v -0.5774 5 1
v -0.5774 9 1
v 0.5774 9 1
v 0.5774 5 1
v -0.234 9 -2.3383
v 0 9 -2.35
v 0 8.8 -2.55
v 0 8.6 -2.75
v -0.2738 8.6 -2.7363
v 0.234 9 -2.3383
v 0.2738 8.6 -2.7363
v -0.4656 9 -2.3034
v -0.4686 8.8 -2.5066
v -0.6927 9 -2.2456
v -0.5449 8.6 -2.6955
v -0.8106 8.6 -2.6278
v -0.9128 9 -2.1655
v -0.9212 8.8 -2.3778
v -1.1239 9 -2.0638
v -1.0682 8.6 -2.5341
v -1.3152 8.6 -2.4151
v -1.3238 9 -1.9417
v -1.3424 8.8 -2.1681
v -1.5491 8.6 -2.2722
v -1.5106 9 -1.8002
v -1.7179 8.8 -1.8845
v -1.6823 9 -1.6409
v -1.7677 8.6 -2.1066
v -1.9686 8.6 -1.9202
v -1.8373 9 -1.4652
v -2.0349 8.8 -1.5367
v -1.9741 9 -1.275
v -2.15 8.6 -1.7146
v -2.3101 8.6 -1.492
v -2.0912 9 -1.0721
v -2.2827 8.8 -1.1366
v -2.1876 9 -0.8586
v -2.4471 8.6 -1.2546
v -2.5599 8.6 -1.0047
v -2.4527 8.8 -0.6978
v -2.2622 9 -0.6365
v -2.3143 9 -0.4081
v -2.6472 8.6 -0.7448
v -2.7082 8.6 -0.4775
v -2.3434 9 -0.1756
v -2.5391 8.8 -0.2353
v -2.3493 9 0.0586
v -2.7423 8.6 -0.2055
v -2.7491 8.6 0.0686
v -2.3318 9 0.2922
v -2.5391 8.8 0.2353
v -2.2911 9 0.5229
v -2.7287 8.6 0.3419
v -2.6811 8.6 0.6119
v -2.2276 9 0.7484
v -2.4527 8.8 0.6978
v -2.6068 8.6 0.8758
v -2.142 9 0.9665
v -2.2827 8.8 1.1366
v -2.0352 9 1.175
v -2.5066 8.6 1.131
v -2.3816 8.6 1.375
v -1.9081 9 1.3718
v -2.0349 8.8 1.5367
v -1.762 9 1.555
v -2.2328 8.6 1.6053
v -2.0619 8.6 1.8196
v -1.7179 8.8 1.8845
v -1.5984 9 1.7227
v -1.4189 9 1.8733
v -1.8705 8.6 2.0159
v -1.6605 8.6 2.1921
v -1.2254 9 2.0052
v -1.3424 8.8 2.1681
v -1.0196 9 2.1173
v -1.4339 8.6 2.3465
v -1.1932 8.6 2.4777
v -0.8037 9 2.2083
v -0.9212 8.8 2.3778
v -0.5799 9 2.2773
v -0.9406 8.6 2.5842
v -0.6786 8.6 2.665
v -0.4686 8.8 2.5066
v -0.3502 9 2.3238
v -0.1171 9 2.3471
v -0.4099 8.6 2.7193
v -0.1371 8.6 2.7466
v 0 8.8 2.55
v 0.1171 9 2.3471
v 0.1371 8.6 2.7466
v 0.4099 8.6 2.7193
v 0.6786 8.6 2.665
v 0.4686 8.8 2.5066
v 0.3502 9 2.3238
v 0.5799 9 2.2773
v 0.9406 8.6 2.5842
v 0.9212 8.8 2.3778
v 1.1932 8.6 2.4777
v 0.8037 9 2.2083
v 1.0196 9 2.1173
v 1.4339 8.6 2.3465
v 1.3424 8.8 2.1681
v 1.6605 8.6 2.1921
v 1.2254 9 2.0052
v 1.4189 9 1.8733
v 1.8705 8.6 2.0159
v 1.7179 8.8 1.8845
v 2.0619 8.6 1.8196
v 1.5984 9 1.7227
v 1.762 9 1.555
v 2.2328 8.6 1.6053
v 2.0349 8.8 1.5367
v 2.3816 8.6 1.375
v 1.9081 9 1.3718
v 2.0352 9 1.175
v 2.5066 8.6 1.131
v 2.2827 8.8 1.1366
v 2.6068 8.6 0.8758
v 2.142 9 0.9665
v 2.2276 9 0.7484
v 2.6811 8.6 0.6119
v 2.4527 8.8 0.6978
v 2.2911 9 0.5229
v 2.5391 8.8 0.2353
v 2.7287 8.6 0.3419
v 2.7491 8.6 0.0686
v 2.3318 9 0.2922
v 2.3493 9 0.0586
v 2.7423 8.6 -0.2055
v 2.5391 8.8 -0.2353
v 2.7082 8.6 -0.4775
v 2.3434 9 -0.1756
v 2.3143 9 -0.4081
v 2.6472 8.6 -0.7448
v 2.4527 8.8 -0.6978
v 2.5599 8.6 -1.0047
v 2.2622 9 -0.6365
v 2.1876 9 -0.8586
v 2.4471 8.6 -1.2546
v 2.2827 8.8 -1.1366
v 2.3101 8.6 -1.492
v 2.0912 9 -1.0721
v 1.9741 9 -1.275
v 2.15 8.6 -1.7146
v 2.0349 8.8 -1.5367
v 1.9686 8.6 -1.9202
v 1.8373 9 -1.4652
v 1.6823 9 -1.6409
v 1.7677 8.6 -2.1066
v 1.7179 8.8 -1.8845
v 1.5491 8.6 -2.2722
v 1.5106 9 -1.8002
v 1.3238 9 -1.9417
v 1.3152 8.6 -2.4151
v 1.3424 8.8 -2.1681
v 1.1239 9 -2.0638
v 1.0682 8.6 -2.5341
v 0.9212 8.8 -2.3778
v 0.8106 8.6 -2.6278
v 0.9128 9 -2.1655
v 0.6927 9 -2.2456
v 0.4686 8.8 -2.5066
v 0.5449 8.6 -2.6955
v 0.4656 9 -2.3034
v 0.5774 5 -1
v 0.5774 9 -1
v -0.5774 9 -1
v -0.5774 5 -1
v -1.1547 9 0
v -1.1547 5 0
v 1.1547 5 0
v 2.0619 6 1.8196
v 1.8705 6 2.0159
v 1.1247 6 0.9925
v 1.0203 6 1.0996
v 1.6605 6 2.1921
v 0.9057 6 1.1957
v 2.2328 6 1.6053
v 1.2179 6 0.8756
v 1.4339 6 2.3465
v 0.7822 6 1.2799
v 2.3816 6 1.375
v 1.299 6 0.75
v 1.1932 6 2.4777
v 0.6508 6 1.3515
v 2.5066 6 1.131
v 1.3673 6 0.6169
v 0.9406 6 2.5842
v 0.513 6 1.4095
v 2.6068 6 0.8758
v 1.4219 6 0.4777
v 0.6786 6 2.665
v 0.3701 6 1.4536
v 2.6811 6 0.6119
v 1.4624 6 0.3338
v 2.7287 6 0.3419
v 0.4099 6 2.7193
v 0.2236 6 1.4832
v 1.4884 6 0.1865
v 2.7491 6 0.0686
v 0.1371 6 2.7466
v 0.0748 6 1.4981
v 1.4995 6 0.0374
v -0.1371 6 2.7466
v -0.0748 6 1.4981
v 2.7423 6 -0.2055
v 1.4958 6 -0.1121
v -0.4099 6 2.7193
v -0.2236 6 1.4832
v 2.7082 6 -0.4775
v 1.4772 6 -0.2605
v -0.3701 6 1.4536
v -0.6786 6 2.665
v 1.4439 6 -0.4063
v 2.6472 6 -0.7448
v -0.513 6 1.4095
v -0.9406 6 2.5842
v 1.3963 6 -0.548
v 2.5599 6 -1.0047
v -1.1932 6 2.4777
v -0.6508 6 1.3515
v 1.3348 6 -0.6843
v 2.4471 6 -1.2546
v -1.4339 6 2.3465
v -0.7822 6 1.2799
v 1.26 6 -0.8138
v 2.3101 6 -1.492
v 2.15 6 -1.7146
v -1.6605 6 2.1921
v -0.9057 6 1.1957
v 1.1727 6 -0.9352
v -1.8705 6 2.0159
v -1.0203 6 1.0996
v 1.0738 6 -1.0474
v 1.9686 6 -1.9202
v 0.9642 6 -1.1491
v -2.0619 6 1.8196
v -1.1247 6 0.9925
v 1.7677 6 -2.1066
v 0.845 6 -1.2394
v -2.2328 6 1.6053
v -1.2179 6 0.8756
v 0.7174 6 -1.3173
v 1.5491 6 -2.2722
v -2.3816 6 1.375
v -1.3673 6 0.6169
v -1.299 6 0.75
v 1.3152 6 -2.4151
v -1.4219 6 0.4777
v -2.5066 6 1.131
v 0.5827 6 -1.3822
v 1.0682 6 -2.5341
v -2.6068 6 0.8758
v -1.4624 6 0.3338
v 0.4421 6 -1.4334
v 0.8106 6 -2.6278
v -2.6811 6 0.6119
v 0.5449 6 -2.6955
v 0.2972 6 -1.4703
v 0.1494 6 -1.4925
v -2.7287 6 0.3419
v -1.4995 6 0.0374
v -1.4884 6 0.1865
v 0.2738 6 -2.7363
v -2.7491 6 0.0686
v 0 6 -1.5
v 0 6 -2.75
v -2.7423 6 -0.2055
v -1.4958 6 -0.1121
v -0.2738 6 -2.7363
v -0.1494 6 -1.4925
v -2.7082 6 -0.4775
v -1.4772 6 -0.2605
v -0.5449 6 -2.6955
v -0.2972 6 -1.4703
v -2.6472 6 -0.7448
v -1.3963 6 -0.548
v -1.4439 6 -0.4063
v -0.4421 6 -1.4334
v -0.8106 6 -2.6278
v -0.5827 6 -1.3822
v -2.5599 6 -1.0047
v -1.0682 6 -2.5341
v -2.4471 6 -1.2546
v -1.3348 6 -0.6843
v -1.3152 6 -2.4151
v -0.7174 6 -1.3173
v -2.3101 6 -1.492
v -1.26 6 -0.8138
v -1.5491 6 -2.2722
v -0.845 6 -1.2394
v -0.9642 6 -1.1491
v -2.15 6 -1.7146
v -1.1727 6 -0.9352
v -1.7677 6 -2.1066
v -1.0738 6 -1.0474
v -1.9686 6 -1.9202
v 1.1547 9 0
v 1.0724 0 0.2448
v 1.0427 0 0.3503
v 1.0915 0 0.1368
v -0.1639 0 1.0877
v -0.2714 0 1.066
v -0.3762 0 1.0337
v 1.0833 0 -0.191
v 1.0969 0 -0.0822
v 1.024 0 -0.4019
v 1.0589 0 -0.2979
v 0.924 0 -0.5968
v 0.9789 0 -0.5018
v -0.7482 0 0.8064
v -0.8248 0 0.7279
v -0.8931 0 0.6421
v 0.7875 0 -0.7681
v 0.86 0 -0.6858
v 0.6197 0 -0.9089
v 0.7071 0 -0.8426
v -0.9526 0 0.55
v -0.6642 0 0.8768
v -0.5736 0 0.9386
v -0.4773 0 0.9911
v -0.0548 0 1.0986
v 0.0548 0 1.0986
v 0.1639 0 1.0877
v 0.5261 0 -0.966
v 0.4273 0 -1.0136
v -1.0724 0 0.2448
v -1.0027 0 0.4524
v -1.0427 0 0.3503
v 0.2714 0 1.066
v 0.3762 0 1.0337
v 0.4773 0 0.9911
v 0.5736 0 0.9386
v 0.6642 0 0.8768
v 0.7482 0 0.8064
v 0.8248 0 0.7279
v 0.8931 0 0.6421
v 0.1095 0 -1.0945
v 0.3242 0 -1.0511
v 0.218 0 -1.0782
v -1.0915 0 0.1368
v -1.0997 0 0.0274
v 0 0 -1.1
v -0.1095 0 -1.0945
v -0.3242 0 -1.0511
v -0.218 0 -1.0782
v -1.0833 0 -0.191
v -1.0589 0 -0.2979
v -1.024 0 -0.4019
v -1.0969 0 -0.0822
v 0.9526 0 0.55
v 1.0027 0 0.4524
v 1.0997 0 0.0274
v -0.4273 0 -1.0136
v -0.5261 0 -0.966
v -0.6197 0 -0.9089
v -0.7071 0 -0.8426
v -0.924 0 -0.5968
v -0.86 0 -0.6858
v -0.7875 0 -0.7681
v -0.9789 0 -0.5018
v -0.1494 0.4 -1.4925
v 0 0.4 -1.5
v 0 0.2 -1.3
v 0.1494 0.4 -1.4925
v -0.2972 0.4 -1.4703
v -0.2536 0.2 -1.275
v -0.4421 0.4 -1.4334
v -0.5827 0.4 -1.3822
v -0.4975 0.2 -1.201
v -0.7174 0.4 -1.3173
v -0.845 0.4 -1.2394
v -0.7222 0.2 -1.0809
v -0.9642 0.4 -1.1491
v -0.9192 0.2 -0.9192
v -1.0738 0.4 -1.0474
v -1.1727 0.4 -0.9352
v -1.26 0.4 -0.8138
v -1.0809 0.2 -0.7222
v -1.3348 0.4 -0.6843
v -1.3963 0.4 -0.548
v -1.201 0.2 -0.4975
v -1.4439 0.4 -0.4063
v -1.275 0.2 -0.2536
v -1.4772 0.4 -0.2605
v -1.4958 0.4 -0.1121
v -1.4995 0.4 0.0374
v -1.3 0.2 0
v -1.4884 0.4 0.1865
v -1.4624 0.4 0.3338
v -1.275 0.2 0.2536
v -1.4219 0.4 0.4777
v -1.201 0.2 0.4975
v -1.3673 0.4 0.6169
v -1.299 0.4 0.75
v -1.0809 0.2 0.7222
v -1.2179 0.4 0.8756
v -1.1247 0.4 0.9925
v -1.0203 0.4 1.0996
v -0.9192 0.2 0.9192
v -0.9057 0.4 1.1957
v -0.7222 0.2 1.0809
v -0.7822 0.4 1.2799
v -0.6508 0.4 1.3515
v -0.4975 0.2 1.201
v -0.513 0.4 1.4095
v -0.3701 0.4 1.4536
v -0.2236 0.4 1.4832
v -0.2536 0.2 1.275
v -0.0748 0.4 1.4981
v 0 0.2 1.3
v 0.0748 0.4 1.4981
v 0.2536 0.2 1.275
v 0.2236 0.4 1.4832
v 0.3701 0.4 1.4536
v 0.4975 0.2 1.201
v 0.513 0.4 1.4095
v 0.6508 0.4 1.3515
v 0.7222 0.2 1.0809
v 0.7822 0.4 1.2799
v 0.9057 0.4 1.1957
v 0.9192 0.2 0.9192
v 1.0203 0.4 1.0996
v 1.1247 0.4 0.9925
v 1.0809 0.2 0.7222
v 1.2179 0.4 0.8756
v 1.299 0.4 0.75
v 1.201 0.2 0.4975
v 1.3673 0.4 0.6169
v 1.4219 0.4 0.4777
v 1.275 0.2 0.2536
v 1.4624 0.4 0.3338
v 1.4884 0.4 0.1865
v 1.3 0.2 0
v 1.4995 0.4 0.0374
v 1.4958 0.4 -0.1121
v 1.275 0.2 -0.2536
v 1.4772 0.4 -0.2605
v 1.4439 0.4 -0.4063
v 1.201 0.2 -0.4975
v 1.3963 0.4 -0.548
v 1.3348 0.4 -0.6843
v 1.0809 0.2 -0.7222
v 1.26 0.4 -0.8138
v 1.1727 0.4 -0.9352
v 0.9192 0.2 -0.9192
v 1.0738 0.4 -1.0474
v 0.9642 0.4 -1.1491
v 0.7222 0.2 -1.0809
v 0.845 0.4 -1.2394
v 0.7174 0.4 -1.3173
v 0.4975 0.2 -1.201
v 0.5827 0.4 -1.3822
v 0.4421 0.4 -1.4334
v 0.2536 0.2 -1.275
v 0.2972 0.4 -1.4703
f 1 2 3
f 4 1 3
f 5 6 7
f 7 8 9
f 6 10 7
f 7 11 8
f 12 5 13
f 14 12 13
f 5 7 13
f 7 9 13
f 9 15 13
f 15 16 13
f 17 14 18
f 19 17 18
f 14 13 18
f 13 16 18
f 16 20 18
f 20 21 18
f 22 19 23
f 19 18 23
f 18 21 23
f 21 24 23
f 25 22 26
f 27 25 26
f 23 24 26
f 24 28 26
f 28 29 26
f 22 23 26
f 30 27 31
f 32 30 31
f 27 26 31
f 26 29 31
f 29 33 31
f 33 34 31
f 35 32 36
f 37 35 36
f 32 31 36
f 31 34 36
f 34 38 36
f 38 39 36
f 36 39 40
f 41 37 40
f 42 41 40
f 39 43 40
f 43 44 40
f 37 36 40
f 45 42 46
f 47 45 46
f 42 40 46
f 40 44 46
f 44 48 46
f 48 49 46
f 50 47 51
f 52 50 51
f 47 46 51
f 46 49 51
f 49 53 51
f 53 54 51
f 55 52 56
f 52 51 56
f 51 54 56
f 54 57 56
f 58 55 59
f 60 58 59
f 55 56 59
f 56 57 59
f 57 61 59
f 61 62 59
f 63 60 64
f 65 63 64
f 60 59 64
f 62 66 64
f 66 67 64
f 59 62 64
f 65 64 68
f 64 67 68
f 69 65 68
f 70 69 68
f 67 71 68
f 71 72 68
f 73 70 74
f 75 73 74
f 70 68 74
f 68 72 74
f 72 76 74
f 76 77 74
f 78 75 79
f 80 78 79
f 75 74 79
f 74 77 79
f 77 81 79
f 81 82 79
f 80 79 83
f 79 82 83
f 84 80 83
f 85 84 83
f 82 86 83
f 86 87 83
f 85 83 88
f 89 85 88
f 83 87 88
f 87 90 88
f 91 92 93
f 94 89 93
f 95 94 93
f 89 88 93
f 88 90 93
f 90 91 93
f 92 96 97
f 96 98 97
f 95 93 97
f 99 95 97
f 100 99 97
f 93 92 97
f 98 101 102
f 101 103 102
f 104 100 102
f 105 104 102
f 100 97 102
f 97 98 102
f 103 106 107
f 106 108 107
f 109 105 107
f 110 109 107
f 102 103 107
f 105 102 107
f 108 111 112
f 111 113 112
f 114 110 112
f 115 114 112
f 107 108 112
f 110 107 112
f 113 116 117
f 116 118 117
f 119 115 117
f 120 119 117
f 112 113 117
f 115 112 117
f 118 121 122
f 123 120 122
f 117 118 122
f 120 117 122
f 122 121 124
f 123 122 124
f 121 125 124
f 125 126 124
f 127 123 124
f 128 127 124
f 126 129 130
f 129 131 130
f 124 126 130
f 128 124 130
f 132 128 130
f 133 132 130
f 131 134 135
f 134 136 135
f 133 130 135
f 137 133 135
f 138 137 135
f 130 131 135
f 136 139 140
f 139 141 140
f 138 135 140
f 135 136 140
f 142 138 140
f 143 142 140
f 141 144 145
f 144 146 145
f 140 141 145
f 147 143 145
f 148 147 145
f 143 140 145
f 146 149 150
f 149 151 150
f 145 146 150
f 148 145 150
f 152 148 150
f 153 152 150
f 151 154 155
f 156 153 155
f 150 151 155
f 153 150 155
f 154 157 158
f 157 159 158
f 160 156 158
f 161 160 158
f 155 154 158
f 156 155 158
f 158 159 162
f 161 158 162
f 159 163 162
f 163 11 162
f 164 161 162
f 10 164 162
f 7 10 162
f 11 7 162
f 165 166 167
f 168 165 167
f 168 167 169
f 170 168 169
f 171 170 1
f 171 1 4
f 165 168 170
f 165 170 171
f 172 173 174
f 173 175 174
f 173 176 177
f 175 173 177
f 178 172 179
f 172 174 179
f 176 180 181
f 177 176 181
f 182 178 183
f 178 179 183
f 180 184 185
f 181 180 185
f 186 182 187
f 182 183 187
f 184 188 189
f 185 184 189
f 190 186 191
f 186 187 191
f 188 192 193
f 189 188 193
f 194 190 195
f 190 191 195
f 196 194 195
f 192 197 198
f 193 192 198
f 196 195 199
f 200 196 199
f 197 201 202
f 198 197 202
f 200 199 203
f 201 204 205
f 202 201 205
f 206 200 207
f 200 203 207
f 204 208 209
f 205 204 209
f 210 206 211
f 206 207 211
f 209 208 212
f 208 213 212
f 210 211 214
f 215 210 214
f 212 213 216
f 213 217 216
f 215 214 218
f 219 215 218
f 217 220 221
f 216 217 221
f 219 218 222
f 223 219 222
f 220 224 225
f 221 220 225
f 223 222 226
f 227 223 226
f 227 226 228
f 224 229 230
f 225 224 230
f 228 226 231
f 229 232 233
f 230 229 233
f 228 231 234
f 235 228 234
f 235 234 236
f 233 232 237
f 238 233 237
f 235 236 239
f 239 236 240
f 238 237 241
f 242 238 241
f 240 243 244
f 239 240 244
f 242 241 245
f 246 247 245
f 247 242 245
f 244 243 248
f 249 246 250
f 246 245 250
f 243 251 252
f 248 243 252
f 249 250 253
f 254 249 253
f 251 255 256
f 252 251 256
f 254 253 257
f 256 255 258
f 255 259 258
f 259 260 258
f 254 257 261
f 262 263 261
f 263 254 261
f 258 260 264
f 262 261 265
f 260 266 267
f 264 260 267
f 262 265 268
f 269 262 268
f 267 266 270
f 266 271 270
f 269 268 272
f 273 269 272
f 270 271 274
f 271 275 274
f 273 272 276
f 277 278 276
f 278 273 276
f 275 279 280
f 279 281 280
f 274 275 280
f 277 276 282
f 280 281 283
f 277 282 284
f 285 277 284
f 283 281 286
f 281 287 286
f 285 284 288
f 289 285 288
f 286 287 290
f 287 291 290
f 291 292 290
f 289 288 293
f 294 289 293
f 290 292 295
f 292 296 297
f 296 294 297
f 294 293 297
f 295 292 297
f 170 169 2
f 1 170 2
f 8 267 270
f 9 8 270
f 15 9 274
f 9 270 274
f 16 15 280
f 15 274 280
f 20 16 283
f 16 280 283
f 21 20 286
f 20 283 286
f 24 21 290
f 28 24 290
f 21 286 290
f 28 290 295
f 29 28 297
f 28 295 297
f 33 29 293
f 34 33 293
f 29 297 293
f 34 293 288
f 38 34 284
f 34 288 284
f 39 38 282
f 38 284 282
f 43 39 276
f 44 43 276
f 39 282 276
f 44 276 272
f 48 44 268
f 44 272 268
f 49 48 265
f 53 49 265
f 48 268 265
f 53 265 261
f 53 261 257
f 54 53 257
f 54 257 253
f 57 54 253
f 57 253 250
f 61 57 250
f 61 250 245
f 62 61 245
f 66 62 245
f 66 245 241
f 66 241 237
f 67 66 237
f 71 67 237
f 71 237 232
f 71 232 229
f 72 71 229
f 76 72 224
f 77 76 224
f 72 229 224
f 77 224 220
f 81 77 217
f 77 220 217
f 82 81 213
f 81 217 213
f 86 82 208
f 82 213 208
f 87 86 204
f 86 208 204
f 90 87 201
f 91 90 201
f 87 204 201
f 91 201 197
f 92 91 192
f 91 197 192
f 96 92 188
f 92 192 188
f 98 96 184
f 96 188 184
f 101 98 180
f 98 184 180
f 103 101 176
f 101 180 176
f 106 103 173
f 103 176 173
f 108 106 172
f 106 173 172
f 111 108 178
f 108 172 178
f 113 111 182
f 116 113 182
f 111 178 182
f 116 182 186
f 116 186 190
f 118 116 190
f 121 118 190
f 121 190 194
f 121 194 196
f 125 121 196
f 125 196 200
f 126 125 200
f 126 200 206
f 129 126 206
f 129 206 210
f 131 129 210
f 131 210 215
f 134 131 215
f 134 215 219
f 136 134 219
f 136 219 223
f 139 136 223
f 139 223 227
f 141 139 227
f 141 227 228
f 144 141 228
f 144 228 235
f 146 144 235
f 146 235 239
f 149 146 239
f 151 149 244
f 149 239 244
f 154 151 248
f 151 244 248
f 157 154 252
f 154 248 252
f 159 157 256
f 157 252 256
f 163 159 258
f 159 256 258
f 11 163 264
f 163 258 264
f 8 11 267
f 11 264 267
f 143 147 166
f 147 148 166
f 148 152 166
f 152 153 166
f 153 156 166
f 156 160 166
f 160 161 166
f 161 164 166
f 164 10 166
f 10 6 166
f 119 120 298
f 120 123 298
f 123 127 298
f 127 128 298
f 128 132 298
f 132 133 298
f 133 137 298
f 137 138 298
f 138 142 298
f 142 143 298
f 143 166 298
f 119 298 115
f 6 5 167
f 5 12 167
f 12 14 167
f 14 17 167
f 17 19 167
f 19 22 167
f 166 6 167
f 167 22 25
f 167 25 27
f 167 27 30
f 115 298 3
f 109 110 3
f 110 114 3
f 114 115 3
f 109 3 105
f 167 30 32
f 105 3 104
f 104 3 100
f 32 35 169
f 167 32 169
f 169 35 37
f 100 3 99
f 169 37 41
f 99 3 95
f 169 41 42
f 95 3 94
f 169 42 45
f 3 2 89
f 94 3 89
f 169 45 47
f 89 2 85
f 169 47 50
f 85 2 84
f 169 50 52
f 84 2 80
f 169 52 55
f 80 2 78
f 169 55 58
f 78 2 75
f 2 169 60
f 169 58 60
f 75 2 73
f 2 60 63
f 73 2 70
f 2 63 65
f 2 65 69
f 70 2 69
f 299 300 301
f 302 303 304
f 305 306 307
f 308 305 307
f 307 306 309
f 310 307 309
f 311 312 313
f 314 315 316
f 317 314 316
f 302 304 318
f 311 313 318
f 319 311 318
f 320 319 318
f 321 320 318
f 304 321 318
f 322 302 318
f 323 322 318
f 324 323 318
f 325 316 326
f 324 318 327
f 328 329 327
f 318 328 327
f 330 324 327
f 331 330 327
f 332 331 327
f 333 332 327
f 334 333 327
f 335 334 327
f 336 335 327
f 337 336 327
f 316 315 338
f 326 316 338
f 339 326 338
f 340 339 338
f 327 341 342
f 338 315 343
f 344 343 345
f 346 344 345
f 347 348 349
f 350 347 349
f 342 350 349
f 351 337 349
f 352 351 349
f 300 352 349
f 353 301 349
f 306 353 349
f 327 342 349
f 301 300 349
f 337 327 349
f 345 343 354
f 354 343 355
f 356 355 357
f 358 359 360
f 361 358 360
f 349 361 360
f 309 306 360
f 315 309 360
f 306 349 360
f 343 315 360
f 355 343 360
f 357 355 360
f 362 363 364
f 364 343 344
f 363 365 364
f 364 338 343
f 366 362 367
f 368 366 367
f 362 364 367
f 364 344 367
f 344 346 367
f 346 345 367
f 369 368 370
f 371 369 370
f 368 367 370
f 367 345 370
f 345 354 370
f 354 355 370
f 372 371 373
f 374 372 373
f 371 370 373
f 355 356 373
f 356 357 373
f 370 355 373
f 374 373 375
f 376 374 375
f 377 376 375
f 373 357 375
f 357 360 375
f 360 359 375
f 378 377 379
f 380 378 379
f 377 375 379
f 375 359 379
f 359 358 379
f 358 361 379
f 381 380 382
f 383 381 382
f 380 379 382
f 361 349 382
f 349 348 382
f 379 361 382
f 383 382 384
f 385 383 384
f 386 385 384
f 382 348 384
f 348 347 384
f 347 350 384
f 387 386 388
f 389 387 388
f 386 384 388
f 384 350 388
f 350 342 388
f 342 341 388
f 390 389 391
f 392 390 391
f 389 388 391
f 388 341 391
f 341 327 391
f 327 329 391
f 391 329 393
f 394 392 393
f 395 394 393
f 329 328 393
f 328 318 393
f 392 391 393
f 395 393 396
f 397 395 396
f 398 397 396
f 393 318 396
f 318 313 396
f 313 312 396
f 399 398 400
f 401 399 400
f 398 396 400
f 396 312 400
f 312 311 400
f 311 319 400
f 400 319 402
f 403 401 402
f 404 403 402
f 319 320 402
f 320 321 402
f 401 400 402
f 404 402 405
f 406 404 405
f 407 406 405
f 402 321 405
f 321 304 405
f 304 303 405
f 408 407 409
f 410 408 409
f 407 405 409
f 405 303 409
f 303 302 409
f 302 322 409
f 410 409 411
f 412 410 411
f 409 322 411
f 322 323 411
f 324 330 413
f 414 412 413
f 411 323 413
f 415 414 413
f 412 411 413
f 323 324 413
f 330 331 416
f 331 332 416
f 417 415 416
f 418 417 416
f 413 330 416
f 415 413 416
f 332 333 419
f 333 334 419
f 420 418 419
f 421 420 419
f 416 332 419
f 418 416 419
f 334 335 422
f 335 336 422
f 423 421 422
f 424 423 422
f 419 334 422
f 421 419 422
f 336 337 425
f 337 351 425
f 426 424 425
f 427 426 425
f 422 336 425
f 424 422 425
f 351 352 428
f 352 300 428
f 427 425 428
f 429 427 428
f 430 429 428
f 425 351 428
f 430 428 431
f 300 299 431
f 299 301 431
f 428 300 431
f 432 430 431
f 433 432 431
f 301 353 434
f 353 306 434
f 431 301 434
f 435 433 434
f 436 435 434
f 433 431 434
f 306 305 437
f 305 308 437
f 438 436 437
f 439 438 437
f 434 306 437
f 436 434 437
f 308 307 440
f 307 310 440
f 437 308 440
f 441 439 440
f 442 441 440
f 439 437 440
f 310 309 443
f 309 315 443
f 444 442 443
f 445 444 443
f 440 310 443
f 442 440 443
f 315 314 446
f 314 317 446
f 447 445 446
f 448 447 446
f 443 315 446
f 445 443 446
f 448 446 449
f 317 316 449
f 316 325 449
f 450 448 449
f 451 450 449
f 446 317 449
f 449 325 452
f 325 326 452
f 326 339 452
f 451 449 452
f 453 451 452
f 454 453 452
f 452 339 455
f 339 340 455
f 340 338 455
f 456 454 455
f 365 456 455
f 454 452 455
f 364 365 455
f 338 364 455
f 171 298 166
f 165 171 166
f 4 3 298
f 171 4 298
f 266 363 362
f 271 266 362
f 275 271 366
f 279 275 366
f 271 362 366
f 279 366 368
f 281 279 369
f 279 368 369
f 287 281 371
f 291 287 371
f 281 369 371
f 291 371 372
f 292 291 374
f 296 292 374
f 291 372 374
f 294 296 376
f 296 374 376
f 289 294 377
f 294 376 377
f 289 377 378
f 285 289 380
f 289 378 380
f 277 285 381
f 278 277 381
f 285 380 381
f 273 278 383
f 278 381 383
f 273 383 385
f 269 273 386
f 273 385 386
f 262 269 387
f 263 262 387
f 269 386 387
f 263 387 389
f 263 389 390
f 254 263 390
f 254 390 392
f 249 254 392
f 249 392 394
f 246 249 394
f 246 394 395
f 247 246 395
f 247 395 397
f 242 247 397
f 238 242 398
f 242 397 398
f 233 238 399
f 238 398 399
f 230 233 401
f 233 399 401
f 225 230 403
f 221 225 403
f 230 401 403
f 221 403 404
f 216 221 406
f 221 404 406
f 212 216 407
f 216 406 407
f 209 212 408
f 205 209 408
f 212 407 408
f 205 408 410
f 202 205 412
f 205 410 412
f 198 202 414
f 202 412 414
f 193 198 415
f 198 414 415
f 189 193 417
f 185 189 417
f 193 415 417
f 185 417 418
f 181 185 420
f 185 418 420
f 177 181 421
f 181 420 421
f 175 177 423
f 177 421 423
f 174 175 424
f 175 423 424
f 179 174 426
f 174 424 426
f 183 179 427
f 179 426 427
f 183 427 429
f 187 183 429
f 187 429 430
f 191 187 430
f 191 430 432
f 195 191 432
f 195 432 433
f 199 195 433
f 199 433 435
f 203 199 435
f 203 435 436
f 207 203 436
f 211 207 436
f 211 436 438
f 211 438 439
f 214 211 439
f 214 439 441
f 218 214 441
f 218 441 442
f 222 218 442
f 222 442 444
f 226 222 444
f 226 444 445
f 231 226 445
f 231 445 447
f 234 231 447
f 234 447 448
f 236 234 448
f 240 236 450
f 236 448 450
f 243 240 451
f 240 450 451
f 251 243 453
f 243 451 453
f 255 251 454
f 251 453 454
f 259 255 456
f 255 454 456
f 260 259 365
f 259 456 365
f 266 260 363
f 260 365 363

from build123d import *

# Parameters (mm, degrees)
CHAMFER1_SIZE      = 0.4
CUT_EXTRUDE2_DEPTH = 4


with BuildPart() as part:
    # Sketch2 → Revolve1 (revolve)
    with BuildSketch(Plane.XY, mode=Mode.PRIVATE) as revolve1_sk:
        Polygon((0, 9), (2.75, 9), (2.75, 6), (1.5, 6), (1.5, 0), (0, 0), align=None)
    revolve(revolve1_sk.sketch.rotate(Axis((0, 0, 0), (0, 1, 0)), 90), axis=Axis((0, 0, 0), (0, 1, 0)))

    # Chamfer1
    chamfer1_edges = [part.edges().sort_by_distance(p)[0] for p in [
        (0, 0, 1.5),
        (0, 9, 2.75),
    ]]
    chamfer(chamfer1_edges, length=CHAMFER1_SIZE)

    # Sketch4 → Cut-Extrude2 (cut)
    with BuildSketch(Plane(origin=(0, 9, 0), x_dir=(1, 0, 0), z_dir=(0, 1, 0))):
        Polygon((1.154700538, 0), (0.577350269, 1), (-0.577350269, 1), (-1.154700538, 0), (-0.577350269, -1), (0.577350269, -1), align=None)
    extrude(amount=-CUT_EXTRUDE2_DEPTH, mode=Mode.SUBTRACT)


solid = part.part
